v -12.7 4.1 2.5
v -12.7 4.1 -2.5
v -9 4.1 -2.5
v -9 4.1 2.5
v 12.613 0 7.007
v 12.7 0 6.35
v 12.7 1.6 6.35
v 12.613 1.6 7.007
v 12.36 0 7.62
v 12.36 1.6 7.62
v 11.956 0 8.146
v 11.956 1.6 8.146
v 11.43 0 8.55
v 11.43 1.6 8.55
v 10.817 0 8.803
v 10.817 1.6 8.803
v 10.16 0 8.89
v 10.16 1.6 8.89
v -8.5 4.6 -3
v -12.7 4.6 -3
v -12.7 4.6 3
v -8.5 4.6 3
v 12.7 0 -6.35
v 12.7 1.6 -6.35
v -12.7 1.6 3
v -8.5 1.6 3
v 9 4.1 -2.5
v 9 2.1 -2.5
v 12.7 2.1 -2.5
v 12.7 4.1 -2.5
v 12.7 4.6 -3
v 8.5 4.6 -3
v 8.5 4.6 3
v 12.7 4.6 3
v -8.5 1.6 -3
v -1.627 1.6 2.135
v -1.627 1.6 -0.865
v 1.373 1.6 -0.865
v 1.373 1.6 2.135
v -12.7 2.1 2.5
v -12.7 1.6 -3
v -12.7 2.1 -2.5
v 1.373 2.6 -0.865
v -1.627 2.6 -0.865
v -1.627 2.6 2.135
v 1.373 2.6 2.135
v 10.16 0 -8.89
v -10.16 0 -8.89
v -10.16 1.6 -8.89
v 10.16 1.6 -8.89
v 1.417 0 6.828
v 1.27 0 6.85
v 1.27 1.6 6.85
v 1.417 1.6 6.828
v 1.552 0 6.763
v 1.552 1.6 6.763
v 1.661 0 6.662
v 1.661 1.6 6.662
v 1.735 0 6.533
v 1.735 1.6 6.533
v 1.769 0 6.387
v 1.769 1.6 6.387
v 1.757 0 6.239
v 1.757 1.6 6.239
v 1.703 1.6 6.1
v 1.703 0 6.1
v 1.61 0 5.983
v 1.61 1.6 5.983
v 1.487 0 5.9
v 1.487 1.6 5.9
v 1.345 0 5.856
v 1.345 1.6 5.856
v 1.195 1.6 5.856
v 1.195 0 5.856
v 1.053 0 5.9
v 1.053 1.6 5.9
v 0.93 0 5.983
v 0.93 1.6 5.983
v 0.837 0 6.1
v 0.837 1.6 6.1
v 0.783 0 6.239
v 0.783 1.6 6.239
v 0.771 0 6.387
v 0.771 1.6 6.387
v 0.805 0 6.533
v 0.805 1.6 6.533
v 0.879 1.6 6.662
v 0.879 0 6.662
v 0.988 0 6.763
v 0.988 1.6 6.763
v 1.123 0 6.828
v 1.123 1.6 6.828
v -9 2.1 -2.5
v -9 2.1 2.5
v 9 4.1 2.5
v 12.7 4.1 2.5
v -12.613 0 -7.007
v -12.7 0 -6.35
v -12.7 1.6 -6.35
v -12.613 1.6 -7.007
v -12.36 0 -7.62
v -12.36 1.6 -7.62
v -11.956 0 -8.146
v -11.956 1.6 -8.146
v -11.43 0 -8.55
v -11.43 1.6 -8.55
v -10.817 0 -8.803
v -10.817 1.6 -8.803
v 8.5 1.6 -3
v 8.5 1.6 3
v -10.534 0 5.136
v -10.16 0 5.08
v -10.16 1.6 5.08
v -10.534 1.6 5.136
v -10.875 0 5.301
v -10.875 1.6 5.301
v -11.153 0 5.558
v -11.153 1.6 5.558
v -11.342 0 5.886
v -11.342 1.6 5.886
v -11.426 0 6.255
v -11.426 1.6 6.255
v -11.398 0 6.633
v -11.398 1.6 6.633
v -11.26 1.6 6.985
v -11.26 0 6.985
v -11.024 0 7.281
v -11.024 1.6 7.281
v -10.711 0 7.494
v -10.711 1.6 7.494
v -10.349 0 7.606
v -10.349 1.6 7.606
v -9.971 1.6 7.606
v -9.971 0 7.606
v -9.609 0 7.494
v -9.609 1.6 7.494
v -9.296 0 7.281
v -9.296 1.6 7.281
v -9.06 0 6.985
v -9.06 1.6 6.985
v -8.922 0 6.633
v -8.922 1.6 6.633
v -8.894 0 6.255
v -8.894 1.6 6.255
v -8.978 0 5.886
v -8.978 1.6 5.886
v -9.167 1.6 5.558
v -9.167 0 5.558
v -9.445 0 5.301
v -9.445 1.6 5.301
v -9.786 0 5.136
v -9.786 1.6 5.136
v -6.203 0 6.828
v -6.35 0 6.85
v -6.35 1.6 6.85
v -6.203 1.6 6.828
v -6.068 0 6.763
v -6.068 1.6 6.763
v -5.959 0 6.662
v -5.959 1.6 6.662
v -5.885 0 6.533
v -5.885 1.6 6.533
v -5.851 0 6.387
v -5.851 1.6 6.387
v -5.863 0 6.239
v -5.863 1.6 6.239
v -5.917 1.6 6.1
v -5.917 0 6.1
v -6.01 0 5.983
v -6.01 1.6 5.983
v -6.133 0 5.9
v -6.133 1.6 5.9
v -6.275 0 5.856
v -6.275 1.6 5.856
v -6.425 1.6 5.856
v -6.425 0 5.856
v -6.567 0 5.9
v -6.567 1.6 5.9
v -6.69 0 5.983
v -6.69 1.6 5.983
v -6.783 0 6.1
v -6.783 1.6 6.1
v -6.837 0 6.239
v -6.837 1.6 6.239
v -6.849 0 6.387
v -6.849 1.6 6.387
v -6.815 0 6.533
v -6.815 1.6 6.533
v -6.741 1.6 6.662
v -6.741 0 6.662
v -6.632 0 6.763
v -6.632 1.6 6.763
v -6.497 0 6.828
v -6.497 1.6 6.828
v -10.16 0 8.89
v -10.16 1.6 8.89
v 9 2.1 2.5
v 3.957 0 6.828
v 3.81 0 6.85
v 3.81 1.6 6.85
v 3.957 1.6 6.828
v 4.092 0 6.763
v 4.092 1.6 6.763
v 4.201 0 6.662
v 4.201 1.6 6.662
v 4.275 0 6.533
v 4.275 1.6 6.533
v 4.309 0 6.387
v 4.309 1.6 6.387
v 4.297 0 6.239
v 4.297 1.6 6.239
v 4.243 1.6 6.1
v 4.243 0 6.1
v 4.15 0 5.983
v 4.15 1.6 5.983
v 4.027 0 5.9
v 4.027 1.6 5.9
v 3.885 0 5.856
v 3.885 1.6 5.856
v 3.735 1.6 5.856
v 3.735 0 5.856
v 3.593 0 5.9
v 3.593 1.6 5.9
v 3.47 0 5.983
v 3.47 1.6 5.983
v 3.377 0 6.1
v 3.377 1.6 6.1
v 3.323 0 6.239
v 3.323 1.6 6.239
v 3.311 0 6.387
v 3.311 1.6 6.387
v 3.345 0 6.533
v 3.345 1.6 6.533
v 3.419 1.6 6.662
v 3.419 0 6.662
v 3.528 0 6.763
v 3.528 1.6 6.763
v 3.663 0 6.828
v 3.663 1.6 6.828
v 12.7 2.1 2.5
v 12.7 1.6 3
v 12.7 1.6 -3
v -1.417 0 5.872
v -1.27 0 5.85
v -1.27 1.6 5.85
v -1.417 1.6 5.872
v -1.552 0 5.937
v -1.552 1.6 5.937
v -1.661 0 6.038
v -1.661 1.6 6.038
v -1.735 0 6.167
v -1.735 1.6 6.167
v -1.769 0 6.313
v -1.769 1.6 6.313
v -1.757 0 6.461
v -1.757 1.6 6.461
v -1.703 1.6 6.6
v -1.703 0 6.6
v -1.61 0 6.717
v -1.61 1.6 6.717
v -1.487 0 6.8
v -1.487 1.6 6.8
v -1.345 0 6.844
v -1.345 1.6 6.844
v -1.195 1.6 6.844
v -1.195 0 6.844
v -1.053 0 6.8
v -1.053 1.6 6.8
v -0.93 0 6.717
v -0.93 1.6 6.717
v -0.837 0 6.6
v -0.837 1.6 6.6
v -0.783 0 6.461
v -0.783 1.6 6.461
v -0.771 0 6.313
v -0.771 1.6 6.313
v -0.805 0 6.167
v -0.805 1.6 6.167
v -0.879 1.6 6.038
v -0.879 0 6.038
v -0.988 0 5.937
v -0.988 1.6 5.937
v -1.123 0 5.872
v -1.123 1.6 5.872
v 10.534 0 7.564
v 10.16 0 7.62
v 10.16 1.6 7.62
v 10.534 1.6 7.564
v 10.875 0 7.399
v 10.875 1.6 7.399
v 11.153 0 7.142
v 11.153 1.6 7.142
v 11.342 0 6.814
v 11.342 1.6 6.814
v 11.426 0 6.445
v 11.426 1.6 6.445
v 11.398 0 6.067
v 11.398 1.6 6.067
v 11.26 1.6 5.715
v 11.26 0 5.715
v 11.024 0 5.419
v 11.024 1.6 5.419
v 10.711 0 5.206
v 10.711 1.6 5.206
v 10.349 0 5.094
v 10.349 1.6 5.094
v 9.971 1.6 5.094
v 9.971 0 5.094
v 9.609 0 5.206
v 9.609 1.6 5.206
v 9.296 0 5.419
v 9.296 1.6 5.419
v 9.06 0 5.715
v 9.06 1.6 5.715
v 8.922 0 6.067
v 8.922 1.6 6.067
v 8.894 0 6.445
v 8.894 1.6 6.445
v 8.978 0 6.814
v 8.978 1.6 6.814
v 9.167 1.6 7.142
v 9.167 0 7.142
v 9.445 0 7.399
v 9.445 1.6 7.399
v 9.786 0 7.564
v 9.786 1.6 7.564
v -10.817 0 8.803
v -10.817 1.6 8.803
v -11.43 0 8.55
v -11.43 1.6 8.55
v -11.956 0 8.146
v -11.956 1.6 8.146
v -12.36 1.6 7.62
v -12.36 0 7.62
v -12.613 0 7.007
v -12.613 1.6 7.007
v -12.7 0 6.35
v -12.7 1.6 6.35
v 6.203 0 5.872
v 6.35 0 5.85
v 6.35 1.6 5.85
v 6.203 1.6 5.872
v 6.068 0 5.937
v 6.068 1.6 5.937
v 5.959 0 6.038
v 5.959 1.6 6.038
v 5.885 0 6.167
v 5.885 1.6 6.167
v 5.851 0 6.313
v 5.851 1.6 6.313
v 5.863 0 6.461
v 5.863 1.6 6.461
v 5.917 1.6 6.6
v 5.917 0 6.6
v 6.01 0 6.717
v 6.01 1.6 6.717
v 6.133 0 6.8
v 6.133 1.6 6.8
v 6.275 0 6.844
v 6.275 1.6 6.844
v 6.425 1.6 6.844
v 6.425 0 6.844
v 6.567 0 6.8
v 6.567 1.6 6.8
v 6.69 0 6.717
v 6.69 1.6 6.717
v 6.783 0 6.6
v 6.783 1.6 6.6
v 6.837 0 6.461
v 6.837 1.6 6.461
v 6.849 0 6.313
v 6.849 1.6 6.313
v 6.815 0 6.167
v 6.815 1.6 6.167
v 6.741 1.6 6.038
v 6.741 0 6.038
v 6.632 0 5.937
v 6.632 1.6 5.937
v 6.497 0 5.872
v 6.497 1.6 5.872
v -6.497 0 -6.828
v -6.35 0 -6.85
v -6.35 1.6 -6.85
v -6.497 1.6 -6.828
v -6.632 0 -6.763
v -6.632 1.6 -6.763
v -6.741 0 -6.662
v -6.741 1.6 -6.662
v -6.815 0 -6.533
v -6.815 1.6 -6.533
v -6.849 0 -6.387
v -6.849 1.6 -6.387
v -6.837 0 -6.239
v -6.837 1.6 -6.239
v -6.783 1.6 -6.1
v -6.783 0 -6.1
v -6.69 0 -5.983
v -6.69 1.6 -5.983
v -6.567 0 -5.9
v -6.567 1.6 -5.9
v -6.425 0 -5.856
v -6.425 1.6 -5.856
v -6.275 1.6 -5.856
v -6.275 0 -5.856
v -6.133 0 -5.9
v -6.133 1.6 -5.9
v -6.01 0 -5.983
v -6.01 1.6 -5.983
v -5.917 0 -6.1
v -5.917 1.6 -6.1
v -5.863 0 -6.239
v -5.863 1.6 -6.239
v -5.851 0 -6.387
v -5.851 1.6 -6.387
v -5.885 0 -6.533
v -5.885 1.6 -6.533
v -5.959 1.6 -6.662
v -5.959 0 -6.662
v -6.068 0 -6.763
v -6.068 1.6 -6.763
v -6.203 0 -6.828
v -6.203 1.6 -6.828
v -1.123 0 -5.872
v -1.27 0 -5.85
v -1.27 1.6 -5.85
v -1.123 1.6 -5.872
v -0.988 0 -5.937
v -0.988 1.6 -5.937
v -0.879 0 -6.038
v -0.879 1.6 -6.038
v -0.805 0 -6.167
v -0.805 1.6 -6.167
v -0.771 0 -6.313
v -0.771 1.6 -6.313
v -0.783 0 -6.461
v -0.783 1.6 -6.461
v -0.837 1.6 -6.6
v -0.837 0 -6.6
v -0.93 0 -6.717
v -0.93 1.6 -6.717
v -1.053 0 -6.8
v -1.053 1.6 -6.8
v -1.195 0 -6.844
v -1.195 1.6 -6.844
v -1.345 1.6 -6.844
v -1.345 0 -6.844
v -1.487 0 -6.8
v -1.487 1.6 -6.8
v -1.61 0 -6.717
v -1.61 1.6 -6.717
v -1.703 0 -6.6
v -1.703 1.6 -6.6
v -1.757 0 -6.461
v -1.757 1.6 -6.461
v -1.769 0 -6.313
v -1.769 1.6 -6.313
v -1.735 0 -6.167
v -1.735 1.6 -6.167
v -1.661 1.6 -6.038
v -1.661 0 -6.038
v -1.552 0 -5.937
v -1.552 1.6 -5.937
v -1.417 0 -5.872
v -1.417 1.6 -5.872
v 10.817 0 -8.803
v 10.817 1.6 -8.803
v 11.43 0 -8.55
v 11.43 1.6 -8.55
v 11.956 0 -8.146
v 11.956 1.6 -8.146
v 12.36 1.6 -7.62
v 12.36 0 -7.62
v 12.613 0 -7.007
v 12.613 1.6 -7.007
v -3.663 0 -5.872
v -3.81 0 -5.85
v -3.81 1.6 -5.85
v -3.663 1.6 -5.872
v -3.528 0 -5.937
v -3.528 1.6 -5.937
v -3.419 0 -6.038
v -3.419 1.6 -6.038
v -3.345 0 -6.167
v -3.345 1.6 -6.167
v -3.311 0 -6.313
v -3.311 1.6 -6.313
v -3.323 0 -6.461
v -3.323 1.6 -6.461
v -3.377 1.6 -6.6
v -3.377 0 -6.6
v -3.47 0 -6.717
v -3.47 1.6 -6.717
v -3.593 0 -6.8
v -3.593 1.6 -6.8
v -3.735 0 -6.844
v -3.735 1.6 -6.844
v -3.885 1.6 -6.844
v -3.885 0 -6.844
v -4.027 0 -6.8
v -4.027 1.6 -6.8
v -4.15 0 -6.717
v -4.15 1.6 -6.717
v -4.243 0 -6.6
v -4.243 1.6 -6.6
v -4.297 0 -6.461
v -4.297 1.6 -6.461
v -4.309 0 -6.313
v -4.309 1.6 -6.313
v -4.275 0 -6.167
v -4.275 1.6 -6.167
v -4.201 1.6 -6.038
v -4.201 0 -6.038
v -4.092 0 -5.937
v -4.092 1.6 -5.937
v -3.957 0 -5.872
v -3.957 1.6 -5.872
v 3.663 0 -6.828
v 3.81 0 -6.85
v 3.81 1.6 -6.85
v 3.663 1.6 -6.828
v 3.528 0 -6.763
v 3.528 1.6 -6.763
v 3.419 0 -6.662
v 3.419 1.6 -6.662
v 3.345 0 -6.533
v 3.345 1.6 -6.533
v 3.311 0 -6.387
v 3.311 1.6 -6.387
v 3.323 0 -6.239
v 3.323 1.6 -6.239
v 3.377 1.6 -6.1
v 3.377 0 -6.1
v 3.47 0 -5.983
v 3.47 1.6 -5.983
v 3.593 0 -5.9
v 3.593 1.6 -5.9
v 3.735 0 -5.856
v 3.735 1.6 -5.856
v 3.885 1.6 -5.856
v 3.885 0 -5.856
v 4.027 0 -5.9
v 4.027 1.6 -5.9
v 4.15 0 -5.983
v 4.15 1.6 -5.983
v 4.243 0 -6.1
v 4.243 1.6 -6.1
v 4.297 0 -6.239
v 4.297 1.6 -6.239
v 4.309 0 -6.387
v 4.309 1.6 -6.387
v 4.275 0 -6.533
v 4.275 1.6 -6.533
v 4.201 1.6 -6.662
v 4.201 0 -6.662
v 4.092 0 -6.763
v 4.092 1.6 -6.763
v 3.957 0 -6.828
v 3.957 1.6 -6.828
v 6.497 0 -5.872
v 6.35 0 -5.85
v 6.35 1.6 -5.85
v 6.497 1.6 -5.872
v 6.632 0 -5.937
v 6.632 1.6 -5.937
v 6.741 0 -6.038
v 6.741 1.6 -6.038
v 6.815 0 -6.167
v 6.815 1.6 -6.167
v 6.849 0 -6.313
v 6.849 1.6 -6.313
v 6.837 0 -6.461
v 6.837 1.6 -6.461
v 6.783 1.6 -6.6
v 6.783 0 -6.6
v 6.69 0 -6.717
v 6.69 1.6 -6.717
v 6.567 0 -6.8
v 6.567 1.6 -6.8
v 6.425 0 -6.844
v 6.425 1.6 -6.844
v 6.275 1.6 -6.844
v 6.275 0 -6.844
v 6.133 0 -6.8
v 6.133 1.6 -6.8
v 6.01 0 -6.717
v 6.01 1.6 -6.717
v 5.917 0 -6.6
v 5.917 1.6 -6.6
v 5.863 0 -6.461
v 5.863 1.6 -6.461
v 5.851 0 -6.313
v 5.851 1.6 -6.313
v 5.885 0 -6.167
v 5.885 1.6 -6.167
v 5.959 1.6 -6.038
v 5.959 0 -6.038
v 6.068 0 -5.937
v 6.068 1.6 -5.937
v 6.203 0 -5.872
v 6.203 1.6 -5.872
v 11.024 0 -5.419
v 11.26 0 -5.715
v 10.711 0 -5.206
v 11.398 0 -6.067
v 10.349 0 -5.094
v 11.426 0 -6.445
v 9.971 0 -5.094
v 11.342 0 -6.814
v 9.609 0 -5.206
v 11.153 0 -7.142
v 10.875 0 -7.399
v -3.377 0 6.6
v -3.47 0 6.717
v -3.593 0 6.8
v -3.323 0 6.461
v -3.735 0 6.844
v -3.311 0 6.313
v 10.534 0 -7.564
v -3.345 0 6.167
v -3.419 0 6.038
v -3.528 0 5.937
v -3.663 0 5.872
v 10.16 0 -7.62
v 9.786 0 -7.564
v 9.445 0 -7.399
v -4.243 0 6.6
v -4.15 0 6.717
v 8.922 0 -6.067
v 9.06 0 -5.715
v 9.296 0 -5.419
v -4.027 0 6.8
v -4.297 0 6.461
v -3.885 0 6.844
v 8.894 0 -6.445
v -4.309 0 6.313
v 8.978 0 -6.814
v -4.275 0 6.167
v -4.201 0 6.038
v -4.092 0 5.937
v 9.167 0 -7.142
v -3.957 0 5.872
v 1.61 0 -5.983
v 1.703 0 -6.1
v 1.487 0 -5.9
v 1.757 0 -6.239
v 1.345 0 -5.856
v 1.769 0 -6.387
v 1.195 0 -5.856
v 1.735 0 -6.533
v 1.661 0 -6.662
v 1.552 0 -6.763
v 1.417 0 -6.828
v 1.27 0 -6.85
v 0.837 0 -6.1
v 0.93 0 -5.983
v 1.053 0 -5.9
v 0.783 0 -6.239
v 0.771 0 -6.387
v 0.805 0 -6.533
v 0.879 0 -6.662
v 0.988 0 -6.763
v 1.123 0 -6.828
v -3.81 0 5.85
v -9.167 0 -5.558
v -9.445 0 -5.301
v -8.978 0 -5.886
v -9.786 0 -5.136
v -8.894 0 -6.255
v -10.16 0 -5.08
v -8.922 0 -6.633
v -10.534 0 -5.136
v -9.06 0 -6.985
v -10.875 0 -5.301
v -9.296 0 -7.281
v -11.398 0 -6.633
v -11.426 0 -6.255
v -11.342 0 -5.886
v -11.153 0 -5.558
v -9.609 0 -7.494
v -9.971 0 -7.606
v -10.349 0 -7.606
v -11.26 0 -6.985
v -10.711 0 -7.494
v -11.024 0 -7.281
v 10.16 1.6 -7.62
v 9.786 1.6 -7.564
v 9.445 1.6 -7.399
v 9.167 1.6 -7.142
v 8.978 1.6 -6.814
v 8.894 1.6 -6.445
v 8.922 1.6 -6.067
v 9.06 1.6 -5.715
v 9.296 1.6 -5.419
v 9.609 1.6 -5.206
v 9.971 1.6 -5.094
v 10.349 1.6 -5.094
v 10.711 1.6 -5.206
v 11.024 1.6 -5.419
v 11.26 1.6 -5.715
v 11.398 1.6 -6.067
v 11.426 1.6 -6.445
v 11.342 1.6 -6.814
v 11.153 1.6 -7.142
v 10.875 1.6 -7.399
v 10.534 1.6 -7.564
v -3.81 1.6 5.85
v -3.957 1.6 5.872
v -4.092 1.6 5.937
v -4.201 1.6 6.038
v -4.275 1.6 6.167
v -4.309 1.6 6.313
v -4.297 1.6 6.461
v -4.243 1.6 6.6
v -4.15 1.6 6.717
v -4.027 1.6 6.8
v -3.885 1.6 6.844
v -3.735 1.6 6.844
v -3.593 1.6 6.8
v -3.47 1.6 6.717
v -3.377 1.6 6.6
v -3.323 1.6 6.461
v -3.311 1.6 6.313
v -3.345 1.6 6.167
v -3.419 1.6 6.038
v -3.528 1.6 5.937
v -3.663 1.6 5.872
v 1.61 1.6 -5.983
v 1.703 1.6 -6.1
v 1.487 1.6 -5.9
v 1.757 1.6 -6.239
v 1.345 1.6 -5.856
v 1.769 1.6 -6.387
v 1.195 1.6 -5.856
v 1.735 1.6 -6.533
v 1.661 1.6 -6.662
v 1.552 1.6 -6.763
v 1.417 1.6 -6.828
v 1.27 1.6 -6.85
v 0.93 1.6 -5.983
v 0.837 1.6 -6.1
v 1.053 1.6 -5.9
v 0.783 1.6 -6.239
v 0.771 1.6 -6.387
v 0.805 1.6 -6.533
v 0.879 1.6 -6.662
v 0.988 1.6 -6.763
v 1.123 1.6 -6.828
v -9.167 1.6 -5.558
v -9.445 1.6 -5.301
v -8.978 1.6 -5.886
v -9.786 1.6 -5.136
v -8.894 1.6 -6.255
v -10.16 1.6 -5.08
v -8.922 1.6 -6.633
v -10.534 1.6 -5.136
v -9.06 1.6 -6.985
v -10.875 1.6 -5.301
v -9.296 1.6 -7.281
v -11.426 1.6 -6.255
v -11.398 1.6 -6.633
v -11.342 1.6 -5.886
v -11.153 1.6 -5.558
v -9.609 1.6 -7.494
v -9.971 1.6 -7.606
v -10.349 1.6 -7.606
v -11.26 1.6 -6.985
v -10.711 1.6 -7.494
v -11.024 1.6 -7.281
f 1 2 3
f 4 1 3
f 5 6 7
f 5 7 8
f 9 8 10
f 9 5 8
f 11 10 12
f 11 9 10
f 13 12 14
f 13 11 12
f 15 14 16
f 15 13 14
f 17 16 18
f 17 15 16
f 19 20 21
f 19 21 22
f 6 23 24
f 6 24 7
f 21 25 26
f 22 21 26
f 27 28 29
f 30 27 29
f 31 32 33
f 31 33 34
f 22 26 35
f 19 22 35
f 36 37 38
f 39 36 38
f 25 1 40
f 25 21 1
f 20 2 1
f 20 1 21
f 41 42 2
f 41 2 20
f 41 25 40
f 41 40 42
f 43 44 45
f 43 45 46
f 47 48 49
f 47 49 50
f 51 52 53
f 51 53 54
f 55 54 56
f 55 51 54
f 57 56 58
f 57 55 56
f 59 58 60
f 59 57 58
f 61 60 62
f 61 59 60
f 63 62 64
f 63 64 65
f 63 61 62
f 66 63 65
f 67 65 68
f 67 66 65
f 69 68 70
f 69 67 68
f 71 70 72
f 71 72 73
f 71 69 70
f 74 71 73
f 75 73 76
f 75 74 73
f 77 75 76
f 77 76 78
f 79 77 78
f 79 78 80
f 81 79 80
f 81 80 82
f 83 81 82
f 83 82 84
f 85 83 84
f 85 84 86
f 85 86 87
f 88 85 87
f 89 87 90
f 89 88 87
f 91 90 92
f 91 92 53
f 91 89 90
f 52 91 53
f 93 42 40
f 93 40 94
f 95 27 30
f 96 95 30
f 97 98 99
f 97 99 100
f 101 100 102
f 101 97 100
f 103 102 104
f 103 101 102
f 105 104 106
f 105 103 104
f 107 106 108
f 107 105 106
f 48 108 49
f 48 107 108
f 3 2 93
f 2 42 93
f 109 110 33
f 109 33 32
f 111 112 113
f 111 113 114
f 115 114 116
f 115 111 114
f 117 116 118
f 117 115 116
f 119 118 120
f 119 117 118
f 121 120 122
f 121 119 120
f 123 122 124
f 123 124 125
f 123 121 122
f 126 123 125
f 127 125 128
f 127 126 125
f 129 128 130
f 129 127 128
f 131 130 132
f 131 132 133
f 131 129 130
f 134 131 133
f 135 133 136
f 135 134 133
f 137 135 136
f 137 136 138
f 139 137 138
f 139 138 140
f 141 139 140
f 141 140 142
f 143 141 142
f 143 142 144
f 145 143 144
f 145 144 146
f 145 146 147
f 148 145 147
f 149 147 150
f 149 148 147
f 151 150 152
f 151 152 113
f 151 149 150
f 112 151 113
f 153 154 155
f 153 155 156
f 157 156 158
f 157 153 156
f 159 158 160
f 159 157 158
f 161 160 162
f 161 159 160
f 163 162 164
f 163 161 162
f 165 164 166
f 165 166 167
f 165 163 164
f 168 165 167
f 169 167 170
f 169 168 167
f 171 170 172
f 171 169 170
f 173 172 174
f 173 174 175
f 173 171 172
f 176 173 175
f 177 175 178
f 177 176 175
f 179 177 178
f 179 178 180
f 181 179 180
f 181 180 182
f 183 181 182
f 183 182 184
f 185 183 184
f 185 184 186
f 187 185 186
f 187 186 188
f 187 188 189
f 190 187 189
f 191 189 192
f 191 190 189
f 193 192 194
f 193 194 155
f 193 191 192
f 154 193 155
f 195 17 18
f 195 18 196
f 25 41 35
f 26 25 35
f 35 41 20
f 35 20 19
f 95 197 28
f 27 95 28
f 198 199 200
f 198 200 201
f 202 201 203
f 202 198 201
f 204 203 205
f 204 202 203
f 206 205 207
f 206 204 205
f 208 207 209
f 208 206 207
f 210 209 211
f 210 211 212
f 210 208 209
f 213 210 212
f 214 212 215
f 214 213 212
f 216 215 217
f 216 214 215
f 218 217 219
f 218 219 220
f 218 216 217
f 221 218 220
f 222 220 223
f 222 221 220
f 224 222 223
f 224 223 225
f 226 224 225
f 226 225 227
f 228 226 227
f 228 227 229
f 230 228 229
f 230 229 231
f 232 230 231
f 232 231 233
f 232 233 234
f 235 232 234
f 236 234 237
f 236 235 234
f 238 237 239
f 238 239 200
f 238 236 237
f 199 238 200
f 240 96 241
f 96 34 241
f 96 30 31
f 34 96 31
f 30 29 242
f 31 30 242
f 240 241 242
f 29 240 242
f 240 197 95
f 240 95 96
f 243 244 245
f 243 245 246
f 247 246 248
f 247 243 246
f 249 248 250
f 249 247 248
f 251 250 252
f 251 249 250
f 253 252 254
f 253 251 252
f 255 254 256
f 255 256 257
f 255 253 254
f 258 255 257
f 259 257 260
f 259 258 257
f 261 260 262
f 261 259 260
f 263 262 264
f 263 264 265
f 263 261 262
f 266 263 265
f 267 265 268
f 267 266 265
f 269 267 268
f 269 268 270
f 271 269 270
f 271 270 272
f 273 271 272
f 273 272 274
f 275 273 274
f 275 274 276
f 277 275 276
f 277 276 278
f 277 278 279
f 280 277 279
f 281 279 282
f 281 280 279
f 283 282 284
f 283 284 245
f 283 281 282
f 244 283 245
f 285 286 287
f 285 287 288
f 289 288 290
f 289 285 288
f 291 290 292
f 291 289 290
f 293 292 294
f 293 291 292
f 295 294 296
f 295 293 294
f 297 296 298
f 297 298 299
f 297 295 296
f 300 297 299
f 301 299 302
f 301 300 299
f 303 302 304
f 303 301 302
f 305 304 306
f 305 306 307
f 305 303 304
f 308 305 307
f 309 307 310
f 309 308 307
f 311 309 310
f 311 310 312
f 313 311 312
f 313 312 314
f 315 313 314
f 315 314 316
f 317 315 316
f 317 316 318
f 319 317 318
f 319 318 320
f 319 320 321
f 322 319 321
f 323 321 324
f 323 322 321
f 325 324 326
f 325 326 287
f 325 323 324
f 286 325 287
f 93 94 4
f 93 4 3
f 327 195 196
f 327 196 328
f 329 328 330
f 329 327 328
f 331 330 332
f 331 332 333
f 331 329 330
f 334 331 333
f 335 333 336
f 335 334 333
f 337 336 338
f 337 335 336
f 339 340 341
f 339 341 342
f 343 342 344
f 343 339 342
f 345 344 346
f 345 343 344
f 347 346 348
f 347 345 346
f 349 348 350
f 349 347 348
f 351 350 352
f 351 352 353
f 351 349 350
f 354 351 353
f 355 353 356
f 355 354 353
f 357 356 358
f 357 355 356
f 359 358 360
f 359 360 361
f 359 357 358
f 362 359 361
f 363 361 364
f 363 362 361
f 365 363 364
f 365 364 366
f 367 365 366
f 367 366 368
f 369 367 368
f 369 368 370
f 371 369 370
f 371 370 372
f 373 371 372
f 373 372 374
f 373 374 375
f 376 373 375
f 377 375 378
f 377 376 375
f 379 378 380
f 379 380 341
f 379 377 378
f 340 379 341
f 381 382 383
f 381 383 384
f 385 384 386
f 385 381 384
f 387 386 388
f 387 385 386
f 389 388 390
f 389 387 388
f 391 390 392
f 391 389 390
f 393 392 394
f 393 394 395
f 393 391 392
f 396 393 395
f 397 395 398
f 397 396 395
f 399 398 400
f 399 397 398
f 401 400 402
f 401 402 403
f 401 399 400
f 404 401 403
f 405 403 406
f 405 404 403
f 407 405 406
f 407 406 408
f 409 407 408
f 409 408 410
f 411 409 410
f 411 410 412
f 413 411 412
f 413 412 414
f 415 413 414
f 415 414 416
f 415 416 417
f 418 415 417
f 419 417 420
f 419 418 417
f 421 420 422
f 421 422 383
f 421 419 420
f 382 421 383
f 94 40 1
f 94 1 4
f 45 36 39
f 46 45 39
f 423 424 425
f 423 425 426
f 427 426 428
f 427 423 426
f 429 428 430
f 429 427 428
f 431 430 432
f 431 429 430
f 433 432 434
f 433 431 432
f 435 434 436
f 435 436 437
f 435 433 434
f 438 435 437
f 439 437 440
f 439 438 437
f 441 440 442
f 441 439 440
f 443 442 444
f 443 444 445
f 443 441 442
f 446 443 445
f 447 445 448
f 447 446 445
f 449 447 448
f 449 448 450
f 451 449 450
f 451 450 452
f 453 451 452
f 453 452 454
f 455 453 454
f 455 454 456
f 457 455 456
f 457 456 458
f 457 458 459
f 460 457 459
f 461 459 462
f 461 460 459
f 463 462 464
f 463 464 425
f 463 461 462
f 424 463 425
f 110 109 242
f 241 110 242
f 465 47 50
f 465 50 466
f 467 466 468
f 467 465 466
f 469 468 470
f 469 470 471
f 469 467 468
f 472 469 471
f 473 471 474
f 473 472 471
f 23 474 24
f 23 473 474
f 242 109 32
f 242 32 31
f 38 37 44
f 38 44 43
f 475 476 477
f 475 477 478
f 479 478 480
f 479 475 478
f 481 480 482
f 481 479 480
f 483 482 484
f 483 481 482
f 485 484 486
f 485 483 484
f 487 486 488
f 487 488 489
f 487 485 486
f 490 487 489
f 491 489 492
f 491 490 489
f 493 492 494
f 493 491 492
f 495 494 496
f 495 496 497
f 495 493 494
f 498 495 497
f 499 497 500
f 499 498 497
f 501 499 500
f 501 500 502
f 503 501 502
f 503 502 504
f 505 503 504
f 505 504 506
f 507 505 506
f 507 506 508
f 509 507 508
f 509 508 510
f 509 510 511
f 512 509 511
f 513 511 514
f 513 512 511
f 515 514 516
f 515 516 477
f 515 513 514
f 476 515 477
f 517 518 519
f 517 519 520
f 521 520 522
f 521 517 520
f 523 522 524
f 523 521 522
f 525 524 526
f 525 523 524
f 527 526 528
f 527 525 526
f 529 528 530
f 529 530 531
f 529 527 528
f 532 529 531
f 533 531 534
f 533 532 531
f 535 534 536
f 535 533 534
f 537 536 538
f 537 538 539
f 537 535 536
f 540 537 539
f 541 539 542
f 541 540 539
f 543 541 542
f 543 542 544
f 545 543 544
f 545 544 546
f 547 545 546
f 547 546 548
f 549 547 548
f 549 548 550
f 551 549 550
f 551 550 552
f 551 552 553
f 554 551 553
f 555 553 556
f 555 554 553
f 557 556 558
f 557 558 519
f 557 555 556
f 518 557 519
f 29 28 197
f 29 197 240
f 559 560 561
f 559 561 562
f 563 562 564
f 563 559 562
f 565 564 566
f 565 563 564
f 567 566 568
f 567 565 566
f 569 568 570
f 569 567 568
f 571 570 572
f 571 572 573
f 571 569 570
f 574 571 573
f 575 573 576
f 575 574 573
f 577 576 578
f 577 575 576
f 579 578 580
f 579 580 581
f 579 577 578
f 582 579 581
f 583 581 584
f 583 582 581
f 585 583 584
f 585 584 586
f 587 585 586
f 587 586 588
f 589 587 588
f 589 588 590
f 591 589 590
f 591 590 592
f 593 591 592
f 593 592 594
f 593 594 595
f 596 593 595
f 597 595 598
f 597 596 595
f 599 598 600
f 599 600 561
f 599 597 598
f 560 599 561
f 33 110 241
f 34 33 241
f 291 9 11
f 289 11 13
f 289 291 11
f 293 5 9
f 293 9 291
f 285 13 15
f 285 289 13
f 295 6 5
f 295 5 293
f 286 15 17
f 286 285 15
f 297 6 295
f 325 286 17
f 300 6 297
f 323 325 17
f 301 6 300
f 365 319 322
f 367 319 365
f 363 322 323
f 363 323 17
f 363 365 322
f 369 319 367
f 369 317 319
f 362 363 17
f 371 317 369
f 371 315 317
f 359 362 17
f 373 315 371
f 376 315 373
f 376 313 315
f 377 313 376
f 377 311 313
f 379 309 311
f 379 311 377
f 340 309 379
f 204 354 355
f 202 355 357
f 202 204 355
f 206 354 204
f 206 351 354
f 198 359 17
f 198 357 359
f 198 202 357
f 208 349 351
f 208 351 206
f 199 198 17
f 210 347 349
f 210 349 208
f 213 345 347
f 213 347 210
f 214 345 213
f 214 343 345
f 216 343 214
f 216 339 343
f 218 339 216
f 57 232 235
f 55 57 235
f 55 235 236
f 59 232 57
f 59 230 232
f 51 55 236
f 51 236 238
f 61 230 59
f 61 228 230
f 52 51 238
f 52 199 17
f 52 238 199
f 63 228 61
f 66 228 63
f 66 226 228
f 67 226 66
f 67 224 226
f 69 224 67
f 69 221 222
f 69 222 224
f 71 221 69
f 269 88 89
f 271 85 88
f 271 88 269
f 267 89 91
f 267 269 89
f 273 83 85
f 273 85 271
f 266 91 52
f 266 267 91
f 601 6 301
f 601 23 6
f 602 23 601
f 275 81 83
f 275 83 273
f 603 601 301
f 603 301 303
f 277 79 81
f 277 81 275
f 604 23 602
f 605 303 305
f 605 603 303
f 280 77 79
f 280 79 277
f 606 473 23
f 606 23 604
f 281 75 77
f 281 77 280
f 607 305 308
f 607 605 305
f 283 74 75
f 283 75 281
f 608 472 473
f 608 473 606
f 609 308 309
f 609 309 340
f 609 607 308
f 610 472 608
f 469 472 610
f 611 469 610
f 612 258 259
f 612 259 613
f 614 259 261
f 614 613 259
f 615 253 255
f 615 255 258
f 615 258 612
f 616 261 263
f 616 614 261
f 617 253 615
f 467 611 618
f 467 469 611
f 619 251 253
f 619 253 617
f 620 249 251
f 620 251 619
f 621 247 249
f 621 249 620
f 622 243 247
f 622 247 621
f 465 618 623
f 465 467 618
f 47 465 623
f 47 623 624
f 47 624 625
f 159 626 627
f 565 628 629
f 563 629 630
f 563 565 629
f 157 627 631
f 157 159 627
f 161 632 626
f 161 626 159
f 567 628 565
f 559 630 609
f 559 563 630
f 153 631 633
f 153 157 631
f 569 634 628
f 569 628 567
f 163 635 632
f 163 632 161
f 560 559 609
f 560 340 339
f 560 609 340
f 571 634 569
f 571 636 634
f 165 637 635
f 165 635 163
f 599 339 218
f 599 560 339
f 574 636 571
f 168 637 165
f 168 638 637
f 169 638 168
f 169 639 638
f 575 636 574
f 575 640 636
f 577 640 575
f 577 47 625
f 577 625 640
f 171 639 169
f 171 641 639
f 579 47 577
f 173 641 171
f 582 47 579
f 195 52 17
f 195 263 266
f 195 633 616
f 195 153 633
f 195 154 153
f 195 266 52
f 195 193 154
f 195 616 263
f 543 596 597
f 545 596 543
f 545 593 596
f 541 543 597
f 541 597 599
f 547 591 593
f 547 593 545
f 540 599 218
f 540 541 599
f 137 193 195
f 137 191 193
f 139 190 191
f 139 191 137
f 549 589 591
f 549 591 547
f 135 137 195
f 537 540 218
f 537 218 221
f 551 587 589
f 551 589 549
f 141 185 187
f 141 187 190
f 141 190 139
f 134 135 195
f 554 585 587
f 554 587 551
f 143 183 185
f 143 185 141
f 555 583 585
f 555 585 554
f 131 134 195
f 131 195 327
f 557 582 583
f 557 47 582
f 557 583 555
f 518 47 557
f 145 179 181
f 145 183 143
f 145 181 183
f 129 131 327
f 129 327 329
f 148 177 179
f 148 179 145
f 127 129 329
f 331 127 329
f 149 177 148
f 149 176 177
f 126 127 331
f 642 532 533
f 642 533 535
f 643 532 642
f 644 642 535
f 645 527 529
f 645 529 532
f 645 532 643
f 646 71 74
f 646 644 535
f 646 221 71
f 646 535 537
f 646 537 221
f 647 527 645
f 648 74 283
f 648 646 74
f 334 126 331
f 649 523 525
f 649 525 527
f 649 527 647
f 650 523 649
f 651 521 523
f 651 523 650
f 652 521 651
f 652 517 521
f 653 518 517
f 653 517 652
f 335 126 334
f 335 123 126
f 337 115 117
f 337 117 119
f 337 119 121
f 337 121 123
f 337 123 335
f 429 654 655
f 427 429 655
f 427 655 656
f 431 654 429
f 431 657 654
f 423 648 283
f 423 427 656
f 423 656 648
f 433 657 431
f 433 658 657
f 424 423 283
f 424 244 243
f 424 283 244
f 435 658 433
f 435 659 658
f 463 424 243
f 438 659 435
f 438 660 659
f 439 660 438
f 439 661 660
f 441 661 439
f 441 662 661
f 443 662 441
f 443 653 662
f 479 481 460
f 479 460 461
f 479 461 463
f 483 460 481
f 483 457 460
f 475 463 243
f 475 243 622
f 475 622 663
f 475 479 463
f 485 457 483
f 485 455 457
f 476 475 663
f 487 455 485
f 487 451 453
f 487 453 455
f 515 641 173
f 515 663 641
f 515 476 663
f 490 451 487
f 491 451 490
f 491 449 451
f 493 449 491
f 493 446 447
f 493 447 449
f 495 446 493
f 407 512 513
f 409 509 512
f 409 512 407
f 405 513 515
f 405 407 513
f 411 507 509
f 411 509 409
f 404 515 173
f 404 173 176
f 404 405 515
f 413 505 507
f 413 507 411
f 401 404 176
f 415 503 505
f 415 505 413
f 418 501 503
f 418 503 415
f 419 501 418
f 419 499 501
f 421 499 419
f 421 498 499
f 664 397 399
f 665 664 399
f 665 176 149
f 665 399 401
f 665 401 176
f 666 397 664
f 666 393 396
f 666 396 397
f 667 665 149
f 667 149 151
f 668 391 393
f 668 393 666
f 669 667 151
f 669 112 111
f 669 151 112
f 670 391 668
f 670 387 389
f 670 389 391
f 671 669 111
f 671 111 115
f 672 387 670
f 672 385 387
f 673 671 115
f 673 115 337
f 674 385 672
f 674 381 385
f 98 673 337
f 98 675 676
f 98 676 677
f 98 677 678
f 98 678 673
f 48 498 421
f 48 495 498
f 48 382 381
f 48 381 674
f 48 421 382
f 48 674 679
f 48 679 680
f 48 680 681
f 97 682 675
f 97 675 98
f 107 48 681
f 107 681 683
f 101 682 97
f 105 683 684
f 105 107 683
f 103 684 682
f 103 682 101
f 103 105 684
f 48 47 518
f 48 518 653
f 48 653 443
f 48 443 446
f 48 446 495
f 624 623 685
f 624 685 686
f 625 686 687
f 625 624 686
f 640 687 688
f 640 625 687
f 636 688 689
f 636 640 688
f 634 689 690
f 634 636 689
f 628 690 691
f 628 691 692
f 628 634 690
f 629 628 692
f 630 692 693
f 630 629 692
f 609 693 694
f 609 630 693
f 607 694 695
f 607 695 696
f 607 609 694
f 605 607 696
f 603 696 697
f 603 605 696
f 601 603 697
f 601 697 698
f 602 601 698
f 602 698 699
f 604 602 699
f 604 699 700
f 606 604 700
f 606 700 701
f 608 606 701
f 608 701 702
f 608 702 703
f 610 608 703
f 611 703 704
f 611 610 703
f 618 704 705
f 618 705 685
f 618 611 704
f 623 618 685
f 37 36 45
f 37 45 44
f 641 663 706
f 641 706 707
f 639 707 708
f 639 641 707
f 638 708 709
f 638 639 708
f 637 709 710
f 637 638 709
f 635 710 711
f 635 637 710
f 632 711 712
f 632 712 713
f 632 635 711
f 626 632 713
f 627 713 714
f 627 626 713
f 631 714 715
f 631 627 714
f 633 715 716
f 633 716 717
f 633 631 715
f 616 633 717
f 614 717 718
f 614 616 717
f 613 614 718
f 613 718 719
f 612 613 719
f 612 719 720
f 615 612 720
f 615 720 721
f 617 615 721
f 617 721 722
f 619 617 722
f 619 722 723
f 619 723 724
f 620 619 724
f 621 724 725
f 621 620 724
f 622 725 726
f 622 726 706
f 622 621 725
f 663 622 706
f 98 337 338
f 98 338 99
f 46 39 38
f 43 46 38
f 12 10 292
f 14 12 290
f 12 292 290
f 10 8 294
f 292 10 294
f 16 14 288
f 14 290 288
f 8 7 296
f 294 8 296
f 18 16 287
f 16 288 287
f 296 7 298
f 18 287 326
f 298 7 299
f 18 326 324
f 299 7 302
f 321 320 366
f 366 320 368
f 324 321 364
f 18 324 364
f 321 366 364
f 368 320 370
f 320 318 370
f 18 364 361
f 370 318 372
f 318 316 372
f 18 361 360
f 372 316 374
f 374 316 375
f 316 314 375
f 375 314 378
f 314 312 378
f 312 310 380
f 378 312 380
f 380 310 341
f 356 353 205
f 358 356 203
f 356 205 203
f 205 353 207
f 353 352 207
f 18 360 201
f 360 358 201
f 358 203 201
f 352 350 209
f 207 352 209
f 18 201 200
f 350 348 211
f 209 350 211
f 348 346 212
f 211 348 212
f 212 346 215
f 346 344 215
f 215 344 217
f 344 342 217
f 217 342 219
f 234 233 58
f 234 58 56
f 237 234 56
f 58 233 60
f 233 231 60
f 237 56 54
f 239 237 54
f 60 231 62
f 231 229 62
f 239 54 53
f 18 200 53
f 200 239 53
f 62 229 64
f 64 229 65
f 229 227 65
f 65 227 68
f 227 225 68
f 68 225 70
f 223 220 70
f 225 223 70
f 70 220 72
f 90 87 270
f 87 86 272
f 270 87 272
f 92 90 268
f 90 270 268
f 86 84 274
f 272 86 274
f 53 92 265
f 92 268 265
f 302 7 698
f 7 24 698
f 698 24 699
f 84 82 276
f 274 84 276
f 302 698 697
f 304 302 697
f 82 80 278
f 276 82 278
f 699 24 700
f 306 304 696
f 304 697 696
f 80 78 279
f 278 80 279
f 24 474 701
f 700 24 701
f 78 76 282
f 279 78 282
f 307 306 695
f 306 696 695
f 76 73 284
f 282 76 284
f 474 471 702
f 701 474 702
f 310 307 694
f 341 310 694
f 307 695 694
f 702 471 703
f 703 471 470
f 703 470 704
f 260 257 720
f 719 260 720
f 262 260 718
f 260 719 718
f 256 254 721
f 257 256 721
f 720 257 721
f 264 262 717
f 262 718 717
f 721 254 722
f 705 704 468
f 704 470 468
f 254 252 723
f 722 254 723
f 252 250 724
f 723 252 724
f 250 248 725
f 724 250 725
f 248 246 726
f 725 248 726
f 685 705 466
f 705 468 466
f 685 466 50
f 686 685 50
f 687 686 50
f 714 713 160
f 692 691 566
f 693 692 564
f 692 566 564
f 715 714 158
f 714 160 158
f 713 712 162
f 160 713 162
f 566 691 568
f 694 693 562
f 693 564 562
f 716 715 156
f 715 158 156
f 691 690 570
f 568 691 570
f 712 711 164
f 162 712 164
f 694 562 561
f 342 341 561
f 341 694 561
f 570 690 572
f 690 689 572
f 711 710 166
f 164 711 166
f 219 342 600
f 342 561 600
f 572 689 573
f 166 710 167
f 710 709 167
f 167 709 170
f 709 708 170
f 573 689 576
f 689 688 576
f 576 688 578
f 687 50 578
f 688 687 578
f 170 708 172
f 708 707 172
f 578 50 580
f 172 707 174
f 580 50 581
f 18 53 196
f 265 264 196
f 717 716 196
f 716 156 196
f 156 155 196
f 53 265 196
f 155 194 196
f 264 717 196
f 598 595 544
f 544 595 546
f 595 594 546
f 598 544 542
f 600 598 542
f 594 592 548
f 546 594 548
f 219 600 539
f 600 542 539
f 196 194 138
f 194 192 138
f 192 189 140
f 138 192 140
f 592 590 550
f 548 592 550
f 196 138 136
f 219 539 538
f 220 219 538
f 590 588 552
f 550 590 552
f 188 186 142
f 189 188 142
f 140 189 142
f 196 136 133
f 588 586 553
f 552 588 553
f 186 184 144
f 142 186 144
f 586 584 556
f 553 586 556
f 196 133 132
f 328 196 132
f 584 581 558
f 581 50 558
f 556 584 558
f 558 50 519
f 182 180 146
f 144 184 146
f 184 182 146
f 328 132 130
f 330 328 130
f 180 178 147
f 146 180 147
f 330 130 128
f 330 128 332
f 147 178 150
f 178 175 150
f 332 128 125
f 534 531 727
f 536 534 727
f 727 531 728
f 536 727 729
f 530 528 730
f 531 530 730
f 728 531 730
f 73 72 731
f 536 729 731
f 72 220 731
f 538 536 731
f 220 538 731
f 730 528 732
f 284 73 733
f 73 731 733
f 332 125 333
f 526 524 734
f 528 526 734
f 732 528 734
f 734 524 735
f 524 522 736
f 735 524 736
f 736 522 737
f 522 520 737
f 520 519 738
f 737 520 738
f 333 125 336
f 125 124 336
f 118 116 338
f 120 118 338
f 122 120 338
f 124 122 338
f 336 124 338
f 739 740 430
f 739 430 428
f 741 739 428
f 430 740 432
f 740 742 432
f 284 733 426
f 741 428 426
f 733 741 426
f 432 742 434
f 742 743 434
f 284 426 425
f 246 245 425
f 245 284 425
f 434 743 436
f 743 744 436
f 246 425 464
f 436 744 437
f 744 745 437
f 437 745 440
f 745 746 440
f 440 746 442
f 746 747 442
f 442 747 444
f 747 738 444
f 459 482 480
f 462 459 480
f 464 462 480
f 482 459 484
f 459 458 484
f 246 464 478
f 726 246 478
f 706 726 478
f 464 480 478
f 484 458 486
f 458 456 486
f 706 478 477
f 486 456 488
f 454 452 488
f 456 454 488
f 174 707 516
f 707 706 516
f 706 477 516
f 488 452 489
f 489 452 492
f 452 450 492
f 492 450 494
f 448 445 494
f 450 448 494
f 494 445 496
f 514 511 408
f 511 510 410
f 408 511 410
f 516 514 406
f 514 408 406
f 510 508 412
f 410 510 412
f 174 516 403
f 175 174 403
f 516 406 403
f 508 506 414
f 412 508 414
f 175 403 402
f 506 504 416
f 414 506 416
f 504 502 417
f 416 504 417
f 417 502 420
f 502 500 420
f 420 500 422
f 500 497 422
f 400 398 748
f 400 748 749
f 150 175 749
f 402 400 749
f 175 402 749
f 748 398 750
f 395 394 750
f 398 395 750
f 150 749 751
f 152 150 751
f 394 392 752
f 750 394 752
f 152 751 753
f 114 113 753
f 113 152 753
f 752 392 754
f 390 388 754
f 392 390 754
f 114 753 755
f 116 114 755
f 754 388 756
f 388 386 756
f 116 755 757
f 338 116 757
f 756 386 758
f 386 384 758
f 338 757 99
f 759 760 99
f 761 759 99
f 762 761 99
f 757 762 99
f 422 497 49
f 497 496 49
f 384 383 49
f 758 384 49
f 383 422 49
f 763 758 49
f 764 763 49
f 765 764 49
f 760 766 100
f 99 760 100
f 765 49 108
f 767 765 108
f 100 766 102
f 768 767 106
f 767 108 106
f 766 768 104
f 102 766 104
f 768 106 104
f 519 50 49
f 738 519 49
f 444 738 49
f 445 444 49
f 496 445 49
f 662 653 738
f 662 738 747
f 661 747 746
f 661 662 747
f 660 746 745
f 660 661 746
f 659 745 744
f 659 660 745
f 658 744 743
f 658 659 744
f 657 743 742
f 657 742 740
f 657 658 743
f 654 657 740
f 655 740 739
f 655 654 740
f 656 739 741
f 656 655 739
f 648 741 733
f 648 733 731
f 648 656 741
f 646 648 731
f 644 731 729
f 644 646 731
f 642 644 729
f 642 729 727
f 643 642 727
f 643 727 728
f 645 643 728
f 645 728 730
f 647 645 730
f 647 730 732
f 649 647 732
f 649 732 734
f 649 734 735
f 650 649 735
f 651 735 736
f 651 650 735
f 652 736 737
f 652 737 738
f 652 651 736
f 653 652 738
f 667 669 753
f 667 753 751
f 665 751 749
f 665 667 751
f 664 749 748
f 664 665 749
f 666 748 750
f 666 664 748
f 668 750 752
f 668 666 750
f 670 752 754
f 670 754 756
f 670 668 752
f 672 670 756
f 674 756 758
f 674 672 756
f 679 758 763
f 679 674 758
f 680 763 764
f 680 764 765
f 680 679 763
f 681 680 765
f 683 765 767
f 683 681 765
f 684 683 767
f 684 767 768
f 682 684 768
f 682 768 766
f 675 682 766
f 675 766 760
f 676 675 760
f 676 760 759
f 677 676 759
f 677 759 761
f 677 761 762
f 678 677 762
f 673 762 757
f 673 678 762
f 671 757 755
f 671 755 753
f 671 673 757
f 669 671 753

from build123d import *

# Parameters (mm, degrees)
SKETCH1_R             = 1.27
SKETCH1_R_2           = 0.5
BOSS_EXTRUDE1_DEPTH   = 1.6
SKETCH2_W             = 3
SKETCH2_H             = 3
BOSS_EXTRUDE2_DEPTH   = 1
SKETCH3_W             = 4.2
SKETCH3_H             = 6
BOSS_EXTRUDE3_DEPTH   = 3
BOSS_EXTRUDE3_2_DEPTH = 3
SHELL1_T              = -0.5
SHELL2_T              = -0.5


with BuildPart() as part:
    # Sketch1 → Boss-Extrude1 (new body)
    with BuildSketch(Plane(origin=(0, 0, 0), x_dir=(1, 0, 0), z_dir=(0, 1, 0))):
        with BuildLine():
            Line((-10.16, 8.89), (10.16, 8.89))
            ThreePointArc((10.16, 8.89), (11.956051224, 8.146051224), (12.7, 6.35))
            Line((12.7, 6.35), (12.7, -6.35))
            ThreePointArc((12.7, -6.35), (11.956051224, -8.146051224), (10.16, -8.89))
            Line((10.16, -8.89), (-10.16, -8.89))
            ThreePointArc((-10.16, -8.89), (-11.956051224, -8.146051224), (-12.7, -6.35))
            Line((-12.7, -6.35), (-12.7, 6.35))
            ThreePointArc((-12.7, 6.35), (-11.956051224, 8.146051224), (-10.16, 8.89))
        make_face()
        with Locations(Location((-10.16, 6.35, 0), (0, 0, 270))):
            Circle(SKETCH1_R, mode=Mode.SUBTRACT)
        with Locations(Location((10.16, 6.35, 0), (0, 0, 90))):
            Circle(SKETCH1_R, mode=Mode.SUBTRACT)
        with Locations(Location((-1.27, -6.35, 0), (0, 0, 90))):
            Circle(SKETCH1_R_2, mode=Mode.SUBTRACT)
        with Locations(Location((-3.81, -6.35, 0), (0, 0, 90))):
            Circle(SKETCH1_R_2, mode=Mode.SUBTRACT)
        with Locations(Location((-6.35, -6.35, 0), (0, 0, 270))):
            Circle(SKETCH1_R_2, mode=Mode.SUBTRACT)
        with Locations(Location((1.27, -6.35, 0), (0, 0, 270))):
            Circle(SKETCH1_R_2, mode=Mode.SUBTRACT)
        with Locations(Location((3.81, -6.35, 0), (0, 0, 270))):
            Circle(SKETCH1_R_2, mode=Mode.SUBTRACT)
        with Locations(Location((6.35, -6.35, 0), (0, 0, 90))):
            Circle(SKETCH1_R_2, mode=Mode.SUBTRACT)
        with Locations(Location((6.35, 6.35, 0), (0, 0, 270))):
            Circle(SKETCH1_R_2, mode=Mode.SUBTRACT)
        with Locations(Location((3.81, 6.35, 0), (0, 0, 90))):
            Circle(SKETCH1_R_2, mode=Mode.SUBTRACT)
        with Locations(Location((1.27, 6.35, 0), (0, 0, 90))):
            Circle(SKETCH1_R_2, mode=Mode.SUBTRACT)
        with Locations(Location((-1.27, 6.35, 0), (0, 0, 270))):
            Circle(SKETCH1_R_2, mode=Mode.SUBTRACT)
        with Locations(Location((-3.81, 6.35, 0), (0, 0, 270))):
            Circle(SKETCH1_R_2, mode=Mode.SUBTRACT)
        with Locations(Location((-6.35, 6.35, 0), (0, 0, 90))):
            Circle(SKETCH1_R_2, mode=Mode.SUBTRACT)
        with Locations(Location((10.16, -6.35, 0), (0, 0, 270))):
            Circle(SKETCH1_R, mode=Mode.SUBTRACT)
        with Locations(Location((-10.16, -6.35, 0), (0, 0, 90))):
            Circle(SKETCH1_R, mode=Mode.SUBTRACT)
    extrude(amount=BOSS_EXTRUDE1_DEPTH)


with BuildPart() as body_2:
    # Sketch2 → Boss-Extrude2 (new body)
    with BuildSketch(Plane(origin=(0, 1.6, 0), x_dir=(1, 0, 0), z_dir=(0, 1, 0))):
        with Locations((-0.127, -0.635)):
            Rectangle(SKETCH2_W, SKETCH2_H)
    extrude(amount=BOSS_EXTRUDE2_DEPTH)


with BuildPart() as body_3:
    # Sketch3 → Boss-Extrude3 (new body)
    with BuildSketch(Plane(origin=(0, 1.6, 0), x_dir=(1, 0, 0), z_dir=(0, 1, 0))):
        with Locations((10.6, 0)):
            Rectangle(SKETCH3_W, SKETCH3_H)
    extrude(amount=BOSS_EXTRUDE3_DEPTH)

    # Shell2
    shell2_openings = [body_3.faces().sort_by_distance(p)[0] for p in [
        (12.7, 3.1, 0),
    ]]
    offset(amount=SHELL2_T, openings=shell2_openings, kind=Kind.INTERSECTION)


with BuildPart() as body_4:
    # Sketch3 → Boss-Extrude3 2 (new body)
    with BuildSketch(Plane(origin=(0, 1.6, 0), x_dir=(1, 0, 0), z_dir=(0, 1, 0))):
        with Locations((-10.6, 0)):
            Rectangle(SKETCH3_W, SKETCH3_H)
    extrude(amount=BOSS_EXTRUDE3_2_DEPTH)

    # Shell1
    shell1_openings = [body_4.faces().sort_by_distance(p)[0] for p in [
        (-12.7, 3.1, 0),
    ]]
    offset(amount=SHELL1_T, openings=shell1_openings, kind=Kind.INTERSECTION)


solid = Compound([part.part, body_2.part, body_3.part, body_4.part])
